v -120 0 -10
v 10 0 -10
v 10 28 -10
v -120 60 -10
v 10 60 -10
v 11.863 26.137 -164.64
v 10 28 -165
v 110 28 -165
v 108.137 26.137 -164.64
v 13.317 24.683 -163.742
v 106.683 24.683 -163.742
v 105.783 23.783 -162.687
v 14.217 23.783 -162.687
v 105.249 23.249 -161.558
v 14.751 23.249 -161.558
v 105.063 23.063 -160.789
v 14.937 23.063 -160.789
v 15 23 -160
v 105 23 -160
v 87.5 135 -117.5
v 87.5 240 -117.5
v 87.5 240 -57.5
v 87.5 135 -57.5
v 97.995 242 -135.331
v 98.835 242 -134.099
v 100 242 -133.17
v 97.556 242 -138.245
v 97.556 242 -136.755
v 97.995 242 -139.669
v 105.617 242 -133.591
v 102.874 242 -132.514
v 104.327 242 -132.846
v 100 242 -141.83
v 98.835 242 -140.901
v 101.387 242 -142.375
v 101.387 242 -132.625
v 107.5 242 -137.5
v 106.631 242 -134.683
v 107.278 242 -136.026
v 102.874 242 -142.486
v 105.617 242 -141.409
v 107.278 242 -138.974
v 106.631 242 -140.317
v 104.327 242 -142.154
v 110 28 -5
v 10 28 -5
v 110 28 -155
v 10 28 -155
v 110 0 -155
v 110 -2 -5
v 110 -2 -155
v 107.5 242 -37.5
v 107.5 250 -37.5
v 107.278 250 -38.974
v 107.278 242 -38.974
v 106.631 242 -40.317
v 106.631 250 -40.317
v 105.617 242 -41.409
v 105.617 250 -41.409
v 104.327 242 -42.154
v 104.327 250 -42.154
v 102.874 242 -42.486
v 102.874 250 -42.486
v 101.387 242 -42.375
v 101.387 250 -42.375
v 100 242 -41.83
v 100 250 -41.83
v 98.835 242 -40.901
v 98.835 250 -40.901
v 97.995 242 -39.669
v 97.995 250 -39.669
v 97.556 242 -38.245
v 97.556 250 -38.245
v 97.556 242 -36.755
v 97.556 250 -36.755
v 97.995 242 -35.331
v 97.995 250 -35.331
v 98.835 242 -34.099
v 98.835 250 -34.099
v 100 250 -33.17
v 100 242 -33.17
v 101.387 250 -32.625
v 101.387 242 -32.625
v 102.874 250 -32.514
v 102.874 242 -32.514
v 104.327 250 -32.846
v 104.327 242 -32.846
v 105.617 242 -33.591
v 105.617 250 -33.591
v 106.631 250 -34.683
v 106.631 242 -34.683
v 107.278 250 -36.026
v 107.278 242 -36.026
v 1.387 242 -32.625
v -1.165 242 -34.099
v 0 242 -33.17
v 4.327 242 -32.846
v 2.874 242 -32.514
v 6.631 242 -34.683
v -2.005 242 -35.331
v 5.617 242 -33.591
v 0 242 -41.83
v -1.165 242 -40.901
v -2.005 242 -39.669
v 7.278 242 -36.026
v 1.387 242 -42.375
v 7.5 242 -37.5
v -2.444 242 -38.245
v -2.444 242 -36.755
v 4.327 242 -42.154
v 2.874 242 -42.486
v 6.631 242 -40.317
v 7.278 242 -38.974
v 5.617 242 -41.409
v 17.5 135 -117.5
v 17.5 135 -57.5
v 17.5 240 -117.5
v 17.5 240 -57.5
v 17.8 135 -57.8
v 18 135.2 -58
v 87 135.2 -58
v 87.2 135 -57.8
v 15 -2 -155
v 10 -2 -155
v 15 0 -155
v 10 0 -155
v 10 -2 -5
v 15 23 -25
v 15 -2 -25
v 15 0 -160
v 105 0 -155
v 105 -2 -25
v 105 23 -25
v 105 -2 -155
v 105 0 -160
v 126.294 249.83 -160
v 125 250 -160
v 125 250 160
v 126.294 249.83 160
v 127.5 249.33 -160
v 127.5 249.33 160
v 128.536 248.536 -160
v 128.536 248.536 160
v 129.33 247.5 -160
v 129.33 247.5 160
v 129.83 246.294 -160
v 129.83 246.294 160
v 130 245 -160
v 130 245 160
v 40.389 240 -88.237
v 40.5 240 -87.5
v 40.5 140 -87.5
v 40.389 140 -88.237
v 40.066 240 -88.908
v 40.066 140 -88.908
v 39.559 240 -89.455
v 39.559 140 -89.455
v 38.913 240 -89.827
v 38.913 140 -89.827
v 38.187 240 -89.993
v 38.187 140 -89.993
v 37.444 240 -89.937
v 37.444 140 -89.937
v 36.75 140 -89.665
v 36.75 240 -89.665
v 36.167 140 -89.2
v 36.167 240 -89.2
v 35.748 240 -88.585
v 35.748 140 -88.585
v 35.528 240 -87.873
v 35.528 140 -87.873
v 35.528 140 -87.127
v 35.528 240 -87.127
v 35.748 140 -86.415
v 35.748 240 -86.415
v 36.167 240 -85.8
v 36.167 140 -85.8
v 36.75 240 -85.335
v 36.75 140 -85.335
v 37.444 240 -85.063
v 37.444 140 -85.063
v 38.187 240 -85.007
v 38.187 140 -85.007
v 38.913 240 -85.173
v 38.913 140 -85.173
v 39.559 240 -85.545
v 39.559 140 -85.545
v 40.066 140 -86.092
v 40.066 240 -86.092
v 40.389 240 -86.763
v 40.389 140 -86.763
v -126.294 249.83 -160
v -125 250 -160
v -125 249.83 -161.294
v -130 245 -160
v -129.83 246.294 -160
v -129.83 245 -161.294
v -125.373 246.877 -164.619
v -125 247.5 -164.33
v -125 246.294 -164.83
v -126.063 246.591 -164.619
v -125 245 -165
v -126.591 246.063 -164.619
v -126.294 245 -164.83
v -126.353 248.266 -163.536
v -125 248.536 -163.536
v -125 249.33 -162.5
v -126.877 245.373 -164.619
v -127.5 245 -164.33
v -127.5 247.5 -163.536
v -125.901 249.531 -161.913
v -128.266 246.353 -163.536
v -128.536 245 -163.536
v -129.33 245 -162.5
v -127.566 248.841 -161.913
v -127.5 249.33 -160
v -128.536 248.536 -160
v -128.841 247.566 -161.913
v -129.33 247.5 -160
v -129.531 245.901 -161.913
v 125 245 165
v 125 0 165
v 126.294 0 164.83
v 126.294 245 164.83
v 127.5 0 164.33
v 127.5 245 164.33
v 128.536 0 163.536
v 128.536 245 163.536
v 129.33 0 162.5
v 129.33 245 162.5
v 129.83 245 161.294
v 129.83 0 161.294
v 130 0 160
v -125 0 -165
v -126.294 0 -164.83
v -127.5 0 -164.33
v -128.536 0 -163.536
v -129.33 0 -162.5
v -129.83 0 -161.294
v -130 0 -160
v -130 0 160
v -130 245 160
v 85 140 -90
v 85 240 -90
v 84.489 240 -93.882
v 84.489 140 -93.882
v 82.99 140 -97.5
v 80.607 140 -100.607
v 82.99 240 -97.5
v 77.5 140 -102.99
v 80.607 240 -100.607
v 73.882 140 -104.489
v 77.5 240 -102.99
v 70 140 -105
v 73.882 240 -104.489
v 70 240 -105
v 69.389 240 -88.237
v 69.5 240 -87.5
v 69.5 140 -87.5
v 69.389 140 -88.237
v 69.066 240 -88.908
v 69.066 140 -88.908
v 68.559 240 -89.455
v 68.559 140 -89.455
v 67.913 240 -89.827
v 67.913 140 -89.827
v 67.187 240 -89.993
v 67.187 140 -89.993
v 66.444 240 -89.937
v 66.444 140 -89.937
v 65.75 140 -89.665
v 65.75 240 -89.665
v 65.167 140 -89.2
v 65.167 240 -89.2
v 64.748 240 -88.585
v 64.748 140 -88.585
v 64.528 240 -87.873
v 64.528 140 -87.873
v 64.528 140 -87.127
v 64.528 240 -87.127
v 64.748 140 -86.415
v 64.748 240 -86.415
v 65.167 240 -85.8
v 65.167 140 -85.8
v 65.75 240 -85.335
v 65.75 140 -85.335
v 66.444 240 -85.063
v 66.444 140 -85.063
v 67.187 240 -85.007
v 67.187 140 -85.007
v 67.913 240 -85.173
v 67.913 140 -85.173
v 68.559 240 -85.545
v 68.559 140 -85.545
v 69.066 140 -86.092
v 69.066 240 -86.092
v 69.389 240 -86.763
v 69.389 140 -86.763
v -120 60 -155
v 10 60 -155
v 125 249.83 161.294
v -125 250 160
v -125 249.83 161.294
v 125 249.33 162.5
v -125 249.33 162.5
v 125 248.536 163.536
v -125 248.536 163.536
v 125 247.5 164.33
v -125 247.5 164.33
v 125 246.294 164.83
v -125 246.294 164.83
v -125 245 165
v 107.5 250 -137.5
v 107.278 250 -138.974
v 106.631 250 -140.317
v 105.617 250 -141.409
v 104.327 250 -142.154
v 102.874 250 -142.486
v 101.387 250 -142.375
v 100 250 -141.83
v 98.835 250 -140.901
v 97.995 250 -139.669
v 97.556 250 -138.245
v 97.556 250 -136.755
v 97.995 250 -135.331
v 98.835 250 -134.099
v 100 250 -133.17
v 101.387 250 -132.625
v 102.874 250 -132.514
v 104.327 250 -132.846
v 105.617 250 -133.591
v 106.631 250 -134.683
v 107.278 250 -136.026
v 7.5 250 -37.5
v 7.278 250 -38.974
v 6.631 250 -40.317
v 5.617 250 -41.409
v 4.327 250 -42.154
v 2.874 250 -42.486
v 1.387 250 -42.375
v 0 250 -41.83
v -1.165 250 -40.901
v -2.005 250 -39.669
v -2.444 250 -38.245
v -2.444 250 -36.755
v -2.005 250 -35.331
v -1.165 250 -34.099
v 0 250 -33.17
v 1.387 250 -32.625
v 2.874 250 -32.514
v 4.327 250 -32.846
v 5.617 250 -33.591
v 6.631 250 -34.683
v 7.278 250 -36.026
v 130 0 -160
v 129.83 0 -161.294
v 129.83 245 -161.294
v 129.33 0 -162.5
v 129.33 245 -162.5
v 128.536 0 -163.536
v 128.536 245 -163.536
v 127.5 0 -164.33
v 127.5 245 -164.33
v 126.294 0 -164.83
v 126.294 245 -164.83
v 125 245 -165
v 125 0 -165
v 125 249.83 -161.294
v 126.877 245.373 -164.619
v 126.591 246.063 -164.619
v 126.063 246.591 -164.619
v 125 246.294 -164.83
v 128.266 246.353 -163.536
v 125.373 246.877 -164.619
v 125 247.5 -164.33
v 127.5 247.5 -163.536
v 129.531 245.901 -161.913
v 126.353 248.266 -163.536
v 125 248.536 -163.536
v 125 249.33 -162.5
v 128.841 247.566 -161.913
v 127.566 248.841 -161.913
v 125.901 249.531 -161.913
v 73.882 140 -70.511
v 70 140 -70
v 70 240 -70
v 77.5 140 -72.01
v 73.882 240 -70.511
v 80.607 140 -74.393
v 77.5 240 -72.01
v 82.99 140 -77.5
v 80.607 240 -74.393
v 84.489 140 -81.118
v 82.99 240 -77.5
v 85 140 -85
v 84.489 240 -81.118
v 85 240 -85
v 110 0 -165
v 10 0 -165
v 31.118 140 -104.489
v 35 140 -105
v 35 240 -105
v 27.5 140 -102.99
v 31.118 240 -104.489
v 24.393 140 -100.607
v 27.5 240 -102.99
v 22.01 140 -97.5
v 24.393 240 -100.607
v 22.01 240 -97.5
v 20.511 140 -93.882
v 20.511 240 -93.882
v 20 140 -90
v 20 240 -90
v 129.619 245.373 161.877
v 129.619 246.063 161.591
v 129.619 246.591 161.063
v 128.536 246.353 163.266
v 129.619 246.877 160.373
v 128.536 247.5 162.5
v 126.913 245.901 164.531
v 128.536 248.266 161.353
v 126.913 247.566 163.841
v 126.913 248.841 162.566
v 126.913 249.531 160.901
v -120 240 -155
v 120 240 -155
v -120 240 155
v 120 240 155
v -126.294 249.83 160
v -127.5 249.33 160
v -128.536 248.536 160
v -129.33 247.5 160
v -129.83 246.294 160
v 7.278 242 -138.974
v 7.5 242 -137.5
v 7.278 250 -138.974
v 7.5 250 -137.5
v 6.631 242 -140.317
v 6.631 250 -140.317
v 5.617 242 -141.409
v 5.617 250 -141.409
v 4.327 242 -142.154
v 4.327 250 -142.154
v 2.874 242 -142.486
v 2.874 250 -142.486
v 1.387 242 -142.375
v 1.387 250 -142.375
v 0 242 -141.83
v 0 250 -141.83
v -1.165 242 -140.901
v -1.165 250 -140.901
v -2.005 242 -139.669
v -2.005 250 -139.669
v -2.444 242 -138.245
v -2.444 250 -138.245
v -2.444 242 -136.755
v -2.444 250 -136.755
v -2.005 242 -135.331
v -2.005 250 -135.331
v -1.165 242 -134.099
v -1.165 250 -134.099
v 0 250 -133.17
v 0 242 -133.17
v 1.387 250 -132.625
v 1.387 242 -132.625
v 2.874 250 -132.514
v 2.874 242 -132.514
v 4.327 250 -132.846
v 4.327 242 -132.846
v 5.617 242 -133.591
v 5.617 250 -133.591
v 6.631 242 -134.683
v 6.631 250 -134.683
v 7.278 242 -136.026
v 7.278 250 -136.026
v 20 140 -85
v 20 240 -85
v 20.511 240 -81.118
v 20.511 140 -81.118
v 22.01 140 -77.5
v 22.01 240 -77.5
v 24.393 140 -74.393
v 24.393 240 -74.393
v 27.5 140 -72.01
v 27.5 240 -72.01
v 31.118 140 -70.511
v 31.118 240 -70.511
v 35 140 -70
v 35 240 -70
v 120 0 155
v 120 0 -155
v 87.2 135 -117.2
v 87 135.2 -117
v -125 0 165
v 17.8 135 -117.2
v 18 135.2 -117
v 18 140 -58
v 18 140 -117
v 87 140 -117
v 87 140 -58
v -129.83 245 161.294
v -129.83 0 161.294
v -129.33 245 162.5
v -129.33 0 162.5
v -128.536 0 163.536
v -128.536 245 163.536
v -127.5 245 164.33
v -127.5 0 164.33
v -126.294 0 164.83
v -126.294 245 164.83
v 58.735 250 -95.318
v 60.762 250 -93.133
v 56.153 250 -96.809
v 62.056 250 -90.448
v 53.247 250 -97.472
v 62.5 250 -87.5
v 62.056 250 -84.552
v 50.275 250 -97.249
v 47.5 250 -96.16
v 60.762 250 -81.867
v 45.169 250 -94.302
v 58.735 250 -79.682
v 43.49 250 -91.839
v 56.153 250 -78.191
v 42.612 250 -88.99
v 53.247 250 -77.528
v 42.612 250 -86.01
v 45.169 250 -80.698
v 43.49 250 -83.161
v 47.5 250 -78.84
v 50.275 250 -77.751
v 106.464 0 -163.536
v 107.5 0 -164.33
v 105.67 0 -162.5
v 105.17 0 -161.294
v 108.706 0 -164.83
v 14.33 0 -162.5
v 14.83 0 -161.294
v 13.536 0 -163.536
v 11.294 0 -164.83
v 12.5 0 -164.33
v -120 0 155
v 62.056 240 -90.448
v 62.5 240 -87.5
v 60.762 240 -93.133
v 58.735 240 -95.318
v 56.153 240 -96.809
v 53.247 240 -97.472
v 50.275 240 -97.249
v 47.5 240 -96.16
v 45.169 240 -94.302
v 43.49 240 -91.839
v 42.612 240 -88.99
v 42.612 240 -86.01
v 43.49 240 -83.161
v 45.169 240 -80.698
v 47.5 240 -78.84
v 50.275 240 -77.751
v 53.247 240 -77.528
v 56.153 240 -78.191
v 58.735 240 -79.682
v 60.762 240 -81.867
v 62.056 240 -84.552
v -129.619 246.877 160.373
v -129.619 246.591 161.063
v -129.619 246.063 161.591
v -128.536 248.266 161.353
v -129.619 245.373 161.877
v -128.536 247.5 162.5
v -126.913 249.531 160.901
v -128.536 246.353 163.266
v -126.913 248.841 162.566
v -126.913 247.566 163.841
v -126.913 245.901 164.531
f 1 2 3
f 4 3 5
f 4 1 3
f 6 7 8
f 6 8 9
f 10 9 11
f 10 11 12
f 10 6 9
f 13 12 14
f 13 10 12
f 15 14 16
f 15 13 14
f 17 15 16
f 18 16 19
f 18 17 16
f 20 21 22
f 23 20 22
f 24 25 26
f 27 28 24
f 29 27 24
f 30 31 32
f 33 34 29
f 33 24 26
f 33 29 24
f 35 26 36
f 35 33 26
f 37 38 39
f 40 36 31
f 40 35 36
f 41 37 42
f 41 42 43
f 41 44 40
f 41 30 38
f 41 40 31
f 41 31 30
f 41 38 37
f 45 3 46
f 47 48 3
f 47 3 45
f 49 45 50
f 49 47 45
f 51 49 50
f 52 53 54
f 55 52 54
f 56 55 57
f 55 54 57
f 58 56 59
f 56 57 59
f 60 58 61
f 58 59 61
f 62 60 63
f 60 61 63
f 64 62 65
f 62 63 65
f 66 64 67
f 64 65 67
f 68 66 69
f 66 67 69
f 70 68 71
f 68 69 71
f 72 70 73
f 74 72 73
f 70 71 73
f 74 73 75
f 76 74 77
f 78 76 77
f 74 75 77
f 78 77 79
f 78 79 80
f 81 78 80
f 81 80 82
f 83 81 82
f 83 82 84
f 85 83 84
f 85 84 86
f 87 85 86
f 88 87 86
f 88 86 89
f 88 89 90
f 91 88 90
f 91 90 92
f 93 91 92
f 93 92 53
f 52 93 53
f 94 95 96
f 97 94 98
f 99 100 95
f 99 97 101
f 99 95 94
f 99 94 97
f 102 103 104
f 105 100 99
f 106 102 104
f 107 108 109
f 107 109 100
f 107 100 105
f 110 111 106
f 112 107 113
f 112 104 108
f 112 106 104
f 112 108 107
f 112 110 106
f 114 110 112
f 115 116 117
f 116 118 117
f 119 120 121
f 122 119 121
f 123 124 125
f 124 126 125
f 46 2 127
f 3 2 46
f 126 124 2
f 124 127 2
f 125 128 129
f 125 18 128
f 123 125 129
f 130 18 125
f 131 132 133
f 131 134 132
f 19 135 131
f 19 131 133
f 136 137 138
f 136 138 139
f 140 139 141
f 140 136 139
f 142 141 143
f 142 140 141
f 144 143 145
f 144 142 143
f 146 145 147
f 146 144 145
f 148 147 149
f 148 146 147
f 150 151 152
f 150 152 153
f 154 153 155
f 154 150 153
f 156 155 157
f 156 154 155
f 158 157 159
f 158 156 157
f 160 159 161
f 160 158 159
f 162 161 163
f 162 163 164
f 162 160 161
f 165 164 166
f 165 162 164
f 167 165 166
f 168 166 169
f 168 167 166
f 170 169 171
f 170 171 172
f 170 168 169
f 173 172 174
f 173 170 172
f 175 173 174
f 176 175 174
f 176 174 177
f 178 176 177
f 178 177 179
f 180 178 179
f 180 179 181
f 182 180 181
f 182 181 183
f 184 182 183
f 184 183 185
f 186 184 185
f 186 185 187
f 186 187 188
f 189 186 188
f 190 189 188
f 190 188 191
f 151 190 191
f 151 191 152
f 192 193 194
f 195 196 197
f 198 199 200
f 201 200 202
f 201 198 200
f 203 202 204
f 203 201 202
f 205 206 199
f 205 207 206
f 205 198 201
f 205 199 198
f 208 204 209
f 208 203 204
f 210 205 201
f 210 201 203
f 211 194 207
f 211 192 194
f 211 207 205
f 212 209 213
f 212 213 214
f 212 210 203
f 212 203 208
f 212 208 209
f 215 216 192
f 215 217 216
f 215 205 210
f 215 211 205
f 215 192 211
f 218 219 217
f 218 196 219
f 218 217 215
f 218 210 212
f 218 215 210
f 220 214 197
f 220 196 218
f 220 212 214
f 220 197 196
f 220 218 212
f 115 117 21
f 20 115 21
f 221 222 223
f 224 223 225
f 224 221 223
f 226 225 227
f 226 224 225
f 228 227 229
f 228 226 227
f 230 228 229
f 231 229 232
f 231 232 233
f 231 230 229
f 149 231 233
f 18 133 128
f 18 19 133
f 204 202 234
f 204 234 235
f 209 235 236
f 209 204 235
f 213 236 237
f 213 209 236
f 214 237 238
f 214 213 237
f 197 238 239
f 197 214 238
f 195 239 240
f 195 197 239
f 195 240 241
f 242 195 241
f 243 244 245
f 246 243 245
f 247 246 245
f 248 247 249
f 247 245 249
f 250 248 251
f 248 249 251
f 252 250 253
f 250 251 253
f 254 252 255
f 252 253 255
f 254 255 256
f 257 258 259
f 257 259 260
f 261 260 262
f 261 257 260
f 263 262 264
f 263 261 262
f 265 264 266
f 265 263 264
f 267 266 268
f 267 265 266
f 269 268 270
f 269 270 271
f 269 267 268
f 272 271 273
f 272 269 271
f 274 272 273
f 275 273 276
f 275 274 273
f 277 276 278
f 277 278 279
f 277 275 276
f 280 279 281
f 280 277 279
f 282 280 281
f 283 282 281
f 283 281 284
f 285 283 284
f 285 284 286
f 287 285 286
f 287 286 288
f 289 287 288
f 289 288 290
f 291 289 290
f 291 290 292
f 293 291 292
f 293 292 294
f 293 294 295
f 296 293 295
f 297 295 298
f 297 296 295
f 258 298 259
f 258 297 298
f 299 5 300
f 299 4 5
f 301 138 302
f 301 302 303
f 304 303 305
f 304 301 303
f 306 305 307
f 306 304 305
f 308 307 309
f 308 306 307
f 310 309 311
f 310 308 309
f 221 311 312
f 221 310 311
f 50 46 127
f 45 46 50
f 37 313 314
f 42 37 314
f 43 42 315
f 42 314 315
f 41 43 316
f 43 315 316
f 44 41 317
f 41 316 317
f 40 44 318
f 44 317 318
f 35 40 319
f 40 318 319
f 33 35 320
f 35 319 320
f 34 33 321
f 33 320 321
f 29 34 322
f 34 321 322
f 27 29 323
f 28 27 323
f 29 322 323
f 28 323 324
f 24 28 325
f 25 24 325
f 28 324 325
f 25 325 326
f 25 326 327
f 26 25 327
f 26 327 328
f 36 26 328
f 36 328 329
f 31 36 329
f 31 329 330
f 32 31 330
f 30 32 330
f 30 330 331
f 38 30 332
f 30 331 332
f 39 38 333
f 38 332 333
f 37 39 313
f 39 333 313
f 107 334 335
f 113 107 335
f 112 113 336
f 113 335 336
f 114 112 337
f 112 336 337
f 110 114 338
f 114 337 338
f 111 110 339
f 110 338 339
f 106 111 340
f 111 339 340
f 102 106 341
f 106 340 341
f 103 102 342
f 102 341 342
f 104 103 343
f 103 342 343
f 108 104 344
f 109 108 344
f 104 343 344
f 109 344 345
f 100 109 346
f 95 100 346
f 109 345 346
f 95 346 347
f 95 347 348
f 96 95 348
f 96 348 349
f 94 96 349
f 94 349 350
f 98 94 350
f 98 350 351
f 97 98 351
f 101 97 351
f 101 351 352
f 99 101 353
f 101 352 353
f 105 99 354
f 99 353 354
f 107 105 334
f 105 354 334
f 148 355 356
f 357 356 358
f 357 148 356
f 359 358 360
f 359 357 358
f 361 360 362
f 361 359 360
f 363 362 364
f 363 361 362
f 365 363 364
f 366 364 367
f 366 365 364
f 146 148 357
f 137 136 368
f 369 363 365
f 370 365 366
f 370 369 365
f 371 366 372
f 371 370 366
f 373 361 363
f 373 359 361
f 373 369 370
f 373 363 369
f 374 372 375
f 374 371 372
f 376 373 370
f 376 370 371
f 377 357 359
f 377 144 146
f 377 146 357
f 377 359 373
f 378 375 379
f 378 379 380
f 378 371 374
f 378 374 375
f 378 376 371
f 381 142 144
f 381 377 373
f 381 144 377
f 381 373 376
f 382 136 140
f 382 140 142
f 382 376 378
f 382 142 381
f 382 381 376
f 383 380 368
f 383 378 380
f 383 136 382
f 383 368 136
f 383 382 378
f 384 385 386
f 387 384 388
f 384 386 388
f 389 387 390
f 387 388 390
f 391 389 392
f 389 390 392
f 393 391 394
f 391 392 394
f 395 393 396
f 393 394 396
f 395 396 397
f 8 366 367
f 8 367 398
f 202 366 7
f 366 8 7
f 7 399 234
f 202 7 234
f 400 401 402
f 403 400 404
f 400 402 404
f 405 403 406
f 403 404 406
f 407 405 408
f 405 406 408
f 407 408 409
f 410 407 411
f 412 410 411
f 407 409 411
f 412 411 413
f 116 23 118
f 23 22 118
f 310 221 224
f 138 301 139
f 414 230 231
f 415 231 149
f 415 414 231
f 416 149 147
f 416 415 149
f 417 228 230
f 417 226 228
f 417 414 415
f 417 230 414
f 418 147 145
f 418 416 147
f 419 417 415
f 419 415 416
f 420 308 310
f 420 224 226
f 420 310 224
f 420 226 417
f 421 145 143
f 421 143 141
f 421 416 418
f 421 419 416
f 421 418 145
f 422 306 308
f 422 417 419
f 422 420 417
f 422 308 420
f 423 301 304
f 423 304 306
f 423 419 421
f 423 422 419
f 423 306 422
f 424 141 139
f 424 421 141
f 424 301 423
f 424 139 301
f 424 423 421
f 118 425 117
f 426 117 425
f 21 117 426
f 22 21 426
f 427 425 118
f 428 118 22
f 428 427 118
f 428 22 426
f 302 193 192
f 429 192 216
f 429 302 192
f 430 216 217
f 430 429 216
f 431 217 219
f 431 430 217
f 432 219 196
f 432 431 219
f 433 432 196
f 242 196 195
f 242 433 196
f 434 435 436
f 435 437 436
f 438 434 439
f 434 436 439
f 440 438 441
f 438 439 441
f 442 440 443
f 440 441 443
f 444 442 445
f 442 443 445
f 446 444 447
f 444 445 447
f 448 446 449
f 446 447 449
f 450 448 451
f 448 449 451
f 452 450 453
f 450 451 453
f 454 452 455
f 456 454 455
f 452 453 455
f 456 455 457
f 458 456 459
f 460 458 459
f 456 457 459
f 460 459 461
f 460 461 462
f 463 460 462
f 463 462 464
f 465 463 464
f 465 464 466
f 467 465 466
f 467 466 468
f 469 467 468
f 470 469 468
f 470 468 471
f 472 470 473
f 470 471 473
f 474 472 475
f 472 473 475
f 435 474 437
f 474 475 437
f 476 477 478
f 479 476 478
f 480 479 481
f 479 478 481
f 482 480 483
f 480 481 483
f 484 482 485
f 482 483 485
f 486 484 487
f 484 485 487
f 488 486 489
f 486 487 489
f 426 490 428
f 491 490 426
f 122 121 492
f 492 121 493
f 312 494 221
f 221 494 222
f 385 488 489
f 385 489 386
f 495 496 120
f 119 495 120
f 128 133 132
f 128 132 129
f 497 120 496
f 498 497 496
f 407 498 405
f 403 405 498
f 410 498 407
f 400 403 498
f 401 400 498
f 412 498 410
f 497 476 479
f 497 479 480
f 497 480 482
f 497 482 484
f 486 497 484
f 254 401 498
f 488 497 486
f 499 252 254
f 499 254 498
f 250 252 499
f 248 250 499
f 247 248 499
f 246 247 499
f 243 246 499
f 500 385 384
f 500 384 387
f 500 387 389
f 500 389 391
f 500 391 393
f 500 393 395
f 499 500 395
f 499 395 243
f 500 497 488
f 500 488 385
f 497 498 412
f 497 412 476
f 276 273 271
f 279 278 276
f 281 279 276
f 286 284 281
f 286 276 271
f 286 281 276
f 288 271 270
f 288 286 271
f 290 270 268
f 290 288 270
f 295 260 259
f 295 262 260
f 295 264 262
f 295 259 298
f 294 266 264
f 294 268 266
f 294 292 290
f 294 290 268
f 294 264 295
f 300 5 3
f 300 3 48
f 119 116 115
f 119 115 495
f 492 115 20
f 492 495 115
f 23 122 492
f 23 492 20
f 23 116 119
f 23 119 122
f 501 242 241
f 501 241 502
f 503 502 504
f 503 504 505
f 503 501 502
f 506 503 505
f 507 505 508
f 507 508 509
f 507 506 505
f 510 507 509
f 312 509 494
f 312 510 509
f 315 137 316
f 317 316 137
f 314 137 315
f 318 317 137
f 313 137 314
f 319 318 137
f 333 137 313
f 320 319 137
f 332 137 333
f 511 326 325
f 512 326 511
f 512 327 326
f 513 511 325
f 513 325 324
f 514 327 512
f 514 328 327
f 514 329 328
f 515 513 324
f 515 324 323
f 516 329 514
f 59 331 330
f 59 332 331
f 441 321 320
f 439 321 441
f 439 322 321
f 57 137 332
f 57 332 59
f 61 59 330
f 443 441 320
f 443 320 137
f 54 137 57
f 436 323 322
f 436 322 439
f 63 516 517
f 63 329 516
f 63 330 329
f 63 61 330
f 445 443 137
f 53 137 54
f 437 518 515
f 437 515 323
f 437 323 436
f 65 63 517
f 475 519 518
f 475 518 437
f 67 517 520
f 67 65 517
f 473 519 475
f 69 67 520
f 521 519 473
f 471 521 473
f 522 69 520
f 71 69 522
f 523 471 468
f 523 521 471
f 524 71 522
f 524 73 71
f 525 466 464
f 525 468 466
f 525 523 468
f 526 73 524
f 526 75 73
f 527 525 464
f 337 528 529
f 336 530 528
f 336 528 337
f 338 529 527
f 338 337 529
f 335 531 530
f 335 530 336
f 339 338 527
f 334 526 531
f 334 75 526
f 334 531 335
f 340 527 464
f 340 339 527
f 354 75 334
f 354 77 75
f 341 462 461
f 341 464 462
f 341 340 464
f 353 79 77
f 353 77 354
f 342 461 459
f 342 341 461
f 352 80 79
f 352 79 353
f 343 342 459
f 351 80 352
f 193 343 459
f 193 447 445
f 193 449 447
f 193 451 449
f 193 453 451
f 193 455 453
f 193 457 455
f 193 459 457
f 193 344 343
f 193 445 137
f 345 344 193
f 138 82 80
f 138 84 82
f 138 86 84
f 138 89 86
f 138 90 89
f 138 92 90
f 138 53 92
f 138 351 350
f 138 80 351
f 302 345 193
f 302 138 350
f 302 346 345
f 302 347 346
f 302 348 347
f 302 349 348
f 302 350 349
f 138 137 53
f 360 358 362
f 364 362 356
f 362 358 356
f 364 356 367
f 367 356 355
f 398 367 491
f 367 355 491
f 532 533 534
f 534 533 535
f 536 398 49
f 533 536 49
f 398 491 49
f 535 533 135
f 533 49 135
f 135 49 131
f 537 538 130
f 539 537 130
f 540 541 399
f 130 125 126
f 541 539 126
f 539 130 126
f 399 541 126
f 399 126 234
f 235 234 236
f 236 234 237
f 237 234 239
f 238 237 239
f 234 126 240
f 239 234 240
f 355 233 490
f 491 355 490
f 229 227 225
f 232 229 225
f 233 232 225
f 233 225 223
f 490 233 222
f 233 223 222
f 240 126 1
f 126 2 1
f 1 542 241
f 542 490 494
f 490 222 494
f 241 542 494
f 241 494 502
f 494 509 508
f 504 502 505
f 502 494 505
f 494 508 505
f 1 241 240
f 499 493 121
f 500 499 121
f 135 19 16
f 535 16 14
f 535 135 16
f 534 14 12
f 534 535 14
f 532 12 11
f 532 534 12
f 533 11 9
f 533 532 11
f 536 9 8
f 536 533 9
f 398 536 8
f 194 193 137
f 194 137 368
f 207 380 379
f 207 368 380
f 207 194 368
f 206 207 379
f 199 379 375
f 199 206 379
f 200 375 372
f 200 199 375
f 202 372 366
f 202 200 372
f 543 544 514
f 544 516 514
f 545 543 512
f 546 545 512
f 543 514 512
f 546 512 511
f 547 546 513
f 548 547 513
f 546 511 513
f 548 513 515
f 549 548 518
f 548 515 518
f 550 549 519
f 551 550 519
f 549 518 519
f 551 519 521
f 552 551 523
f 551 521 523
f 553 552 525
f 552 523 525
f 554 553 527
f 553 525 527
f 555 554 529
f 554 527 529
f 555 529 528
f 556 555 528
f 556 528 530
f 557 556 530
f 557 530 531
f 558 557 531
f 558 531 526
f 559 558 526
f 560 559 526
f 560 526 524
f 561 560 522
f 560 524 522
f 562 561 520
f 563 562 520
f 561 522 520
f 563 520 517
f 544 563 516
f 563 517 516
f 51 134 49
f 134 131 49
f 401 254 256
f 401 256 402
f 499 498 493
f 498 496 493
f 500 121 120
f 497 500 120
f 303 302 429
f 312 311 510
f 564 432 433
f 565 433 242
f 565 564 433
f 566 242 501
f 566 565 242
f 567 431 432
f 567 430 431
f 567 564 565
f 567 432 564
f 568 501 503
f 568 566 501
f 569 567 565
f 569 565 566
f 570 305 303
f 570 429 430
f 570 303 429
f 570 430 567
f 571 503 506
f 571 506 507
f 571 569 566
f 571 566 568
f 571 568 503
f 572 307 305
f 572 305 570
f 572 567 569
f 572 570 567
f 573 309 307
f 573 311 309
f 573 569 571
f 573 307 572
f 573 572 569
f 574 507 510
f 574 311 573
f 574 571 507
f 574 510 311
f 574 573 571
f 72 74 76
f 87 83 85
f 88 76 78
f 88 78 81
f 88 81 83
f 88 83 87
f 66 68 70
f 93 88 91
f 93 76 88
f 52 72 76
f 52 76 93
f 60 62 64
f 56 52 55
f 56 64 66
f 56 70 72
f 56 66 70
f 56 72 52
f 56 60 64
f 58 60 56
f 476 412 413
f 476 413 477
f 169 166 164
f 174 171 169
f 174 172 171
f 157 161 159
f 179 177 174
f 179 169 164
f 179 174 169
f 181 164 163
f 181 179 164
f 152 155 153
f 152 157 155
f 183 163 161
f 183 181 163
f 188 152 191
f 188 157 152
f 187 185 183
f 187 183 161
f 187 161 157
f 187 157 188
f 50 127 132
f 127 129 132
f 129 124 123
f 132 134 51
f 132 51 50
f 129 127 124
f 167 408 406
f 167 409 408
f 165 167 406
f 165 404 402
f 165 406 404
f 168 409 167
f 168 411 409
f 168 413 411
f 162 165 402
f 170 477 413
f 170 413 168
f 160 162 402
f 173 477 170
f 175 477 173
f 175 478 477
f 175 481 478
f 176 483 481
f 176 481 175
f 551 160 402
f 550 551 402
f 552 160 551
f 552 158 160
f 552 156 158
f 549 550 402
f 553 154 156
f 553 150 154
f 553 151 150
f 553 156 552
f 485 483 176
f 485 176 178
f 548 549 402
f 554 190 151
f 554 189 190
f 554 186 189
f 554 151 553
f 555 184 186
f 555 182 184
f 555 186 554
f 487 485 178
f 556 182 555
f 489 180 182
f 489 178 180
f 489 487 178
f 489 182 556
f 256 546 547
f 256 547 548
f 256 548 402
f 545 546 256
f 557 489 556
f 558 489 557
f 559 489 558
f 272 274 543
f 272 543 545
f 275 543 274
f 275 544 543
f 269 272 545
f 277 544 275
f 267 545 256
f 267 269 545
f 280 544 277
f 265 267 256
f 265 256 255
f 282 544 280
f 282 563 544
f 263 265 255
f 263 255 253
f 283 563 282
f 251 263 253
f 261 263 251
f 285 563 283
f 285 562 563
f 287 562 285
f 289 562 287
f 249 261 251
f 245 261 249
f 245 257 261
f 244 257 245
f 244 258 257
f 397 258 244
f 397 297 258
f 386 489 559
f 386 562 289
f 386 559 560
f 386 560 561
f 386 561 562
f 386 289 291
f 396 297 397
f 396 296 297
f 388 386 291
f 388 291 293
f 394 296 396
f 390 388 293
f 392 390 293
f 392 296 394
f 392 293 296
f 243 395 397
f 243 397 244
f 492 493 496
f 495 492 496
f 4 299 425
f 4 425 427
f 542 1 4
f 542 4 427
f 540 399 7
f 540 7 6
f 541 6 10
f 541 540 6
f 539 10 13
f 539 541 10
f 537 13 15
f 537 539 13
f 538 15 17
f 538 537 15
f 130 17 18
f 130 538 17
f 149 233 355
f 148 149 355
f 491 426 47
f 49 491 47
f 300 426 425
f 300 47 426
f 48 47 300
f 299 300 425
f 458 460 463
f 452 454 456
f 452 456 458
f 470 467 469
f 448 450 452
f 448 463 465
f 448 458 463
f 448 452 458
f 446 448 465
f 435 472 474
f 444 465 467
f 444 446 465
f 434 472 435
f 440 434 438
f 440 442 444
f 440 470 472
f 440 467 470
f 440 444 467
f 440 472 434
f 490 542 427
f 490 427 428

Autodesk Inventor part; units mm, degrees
ref_plane "YZ Plane" through (0, 0, 0) normal (1, 0, 0) x (0, 1, 0)
ref_plane "XZ Plane" through (0, 0, 0) normal (0, 1, 0) x (-1, 0, 0)
ref_plane "XY Plane" through (0, 0, 0) normal (0, 0, 1) x (1, 0, 0)
sketch "Sketch1" plane through (0, 0, 0) normal (0, 1, 0) x (-1, 0, 0)
  line L0 (130, 165) -> (-130, 165)
  line L1 (-130, 165) -> (-130, -165)
  line L2 (-130, -165) -> (130, -165)
  line L3 (130, -165) -> (130, 165)
  point P0 (0, 0)
  point P1 (0, -165)
  point P2 (-130, 0)
  dimension "d0" = 260
  dimension "d1" = 330
extrude "Extrusion1" add sketch "Sketch1" along normal blind 250
sketch "Sketch2" plane through (0, 0, 0) normal (0, -1, 0) x (1, 0, 0)
  line L0 (-120, 155) -> (120, 155)
  line L1 (120, 155) -> (120, -155)
  line L2 (120, -155) -> (-120, -155)
  line L3 (-120, -155) -> (-120, 155)
  line L4 (-130, 165) -> (130, 165) projected
  line L5 (130, 165) -> (130, -165) projected
  point P0 (0, 0)
  point P1 (0, 155)
  point P2 (-120, 0)
  dimension "d4" = 10
  dimension "d5" = 10
extrude "Extrusion2" cut sketch "Sketch2" against normal blind 240
fillet "Fillet1" radius 5 8 edges at (0, 250, 165) (-130, 250, 0) (130, 250, 0) (0, 250, -165) (130, 125, -165) (130, 125, 165) (-130, 125, 165) (-130, 125, -165)
sketch "Sketch3" plane through (0, 250, 0) normal (0, 1, 0) x (1, 0, 0)
  circle A0 centre (2.5, 37.5) radius 5
  circle A1 centre (2.5, 137.5) radius 5
  circle A2 centre (102.5, 37.5) radius 5
  circle A3 centre (102.5, 137.5) radius 5
  line L0 (125, 160) -> (125, -160) projected
  line L1 (-125, 160) -> (125, 160) projected
  circle A4 centre (52.5, 87.5) radius 10
  point P0 (0, 0)
  dimension "d9" = 10
  dimension "d10" = 10
  dimension "d11" = 10
  dimension "d12" = 10
  dimension "d13" = 100
  dimension "d14" = 100
  dimension "d15" = 22.5
  dimension "d16" = 22.5
  dimension "d19" = 20
  dimension "d20" = 50
  dimension "d21" = 50
extrude "Extrusion3" cut sketch "Sketch3" against normal blind 8
sketch "Sketch4" plane through (52.5, 242, -87.5) normal (0, 1, 0) x (1, 0, 0)
  circle A0 centre (0, 0) radius 10 projected
  circle A1 centre (0, 0) radius 15
  point P0 (-52.5, -87.5)
extrude "Extrusion4" cut sketch "Sketch4" against normal up to next contours A0
sketch "Sketch5" plane through (0, 240, 0) normal (0, -1, 0) x (1, 0, 0)
  line L0 (87.5, -117.5) -> (17.5, -117.5)
  line L1 (17.5, -117.5) -> (17.5, -57.5)
  line L2 (17.5, -57.5) -> (87.5, -57.5)
  line L3 (87.5, -57.5) -> (87.5, -117.5)
  line L4 (120, -155) -> (-120, -155) projected
  circle A0 centre (52.5, -87.5) radius 15
  circle A1 centre (52.5, -87.5) radius 10 projected
  point P0 (0, 0)
  point P1 (17.5, -87.5)
  point P2 (52.5, -57.5)
  point P3 (52.5, -117.5)
  dimension "d24" = 70
  dimension "d25" = 60
  dimension "d52" = 70
extrude "Extrusion5" add sketch "Sketch5" along normal blind 150 contours L0 L1 L2 L3
sketch "Sketch7" plane through (0, 90, 0) normal (0, -1, 0) x (1, 0, 0)
  line L0 (85, -105) -> (20, -105)
  line L1 (20, -105) -> (20, -70)
  line L2 (20, -70) -> (85, -70)
  line L3 (85, -70) -> (85, -105)
  line L4 (17.5, -117.5) -> (87.5, -117.5) projected
  line L5 (17.5, -57.5) -> (17.5, -117.5) projected
  point P0 (0, 0)
  point P1 (52.5, -105)
  point P2 (52.5, -117.5)
  point P3 (52.5, -117.5)
  point P4 (17.5, -87.5)
  point P5 (20, -87.5)
  point P6 (100, -102.5)
  dimension "d28" = 65
  dimension "d29" = 35
extrude "Extrusion6" cut sketch "Sketch7" against normal blind 150
sketch "Sketch8" plane through (0, 240, 0) normal (0, -1, 0) x (1, 0, 0)
  point P0 (0, 0)
sketch "Sketch9" plane through (0, 240, 0) normal (0, -1, 0) x (1, 0, 0)
  circle A0 centre (67, -87.5) radius 2.5
  circle A1 centre (38, -87.5) radius 2.5
  circle A2 centre (52.5, -87.5) radius 10
  circle A3 centre (52.5, -87.5) radius 10 projected
  point P0 (0, 0)
  dimension "d32" = 5
  dimension "d33" = 5
  dimension "d43" = 14.5
  dimension "d44" = 14.5
extrude "Extrusion7" add sketch "Sketch9" along normal up to surface (150 mm away) contours A0 | A1
fillet "Fillet2" radius 15 4 edges at (20, 165, -70) (20, 165, -105) (85, 165, -70) (85, 165, -105)
sketch "Sketch10" plane through (0, 90, 0) normal (0, -1, 0) x (1, 0, 0)
  point P0 (0, 0)
sketch "Sketch11" plane through (0, 90, 0) normal (0, -1, 0) x (1, 0, 0)
  line L0 (18.5, -58.5) -> (86.5, -58.5)
  line L1 (86.5, -58.5) -> (86.5, -116.5)
  line L2 (86.5, -116.5) -> (18.5, -116.5)
  line L3 (18.5, -116.5) -> (18.5, -58.5)
  line L4 (17.5, -57.5) -> (17.5, -117.5) projected
  line L5 (87.5, -117.5) -> (87.5, -57.5) projected
  line L6 (87.5, -57.5) -> (17.5, -57.5) projected
  line L7 (17.5, -117.5) -> (87.5, -117.5) projected
  point P0 (0, 0)
  point P1 (100, -42.5)
  point P2 (100, -102.5)
  dimension "d46" = 1
  dimension "d47" = 1
  dimension "d48" = 1
  dimension "d49" = 1
extrude "Extrusion8" add sketch "Sketch11" along normal blind 5
sketch "Sketch12" plane through (-120, 0, 155) normal (1, 0, 0) x (0, 0, -1)
  line L0 (315, 0) -> (165, 0)
  line L1 (165, 0) -> (165, 60)
  line L2 (165, 60) -> (315, 60)
  line L3 (315, 60) -> (315, 0)
  line L4 (315, 245) -> (315, 0) projected
  point P0 (155, 0)
  dimension "d53" = 150
  dimension "d54" = 60
  dimension "d57" = 0
extrude "Extrusion9" add sketch "Sketch12" along normal blind 130
sketch "Sketch15" plane through (0, 85, 0) normal (0, -1, 0) x (1, 0, 0)
  line L0 (97.9773, -47.1324) -> (13.5699, -47.1324)
  line L1 (13.5699, -47.1324) -> (13.5699, -120.1648)
  line L2 (13.5699, -120.1648) -> (97.9773, -120.1648)
  line L3 (97.9773, -120.1648) -> (97.9773, -47.1324)
  point P0 (0, 0)
extrude "Extrusion11" cut sketch "Sketch15" against normal blind 50
sketch "Sketch17" plane through (0, 135, 0) normal (0, -1, 0) x (1, 0, 0)
  line L0 (87.5, -57.5) -> (87.5, -117.5) projected
  line L1 (87.5, -117.5) -> (17.5, -117.5) projected
  line L2 (87.5, -57.5) -> (17.5, -57.5)
  line L3 (17.5, -57.5) -> (17.5, -117.5)
  line L4 (17.5, -117.5) -> (87.5, -117.5)
  line L5 (87.5, -117.5) -> (87.5, -57.5)
  line L6 (87, -58) -> (18, -58)
  line L7 (18, -58) -> (18, -117)
  line L8 (18, -117) -> (87, -117)
  line L9 (87, -117) -> (87, -58)
  point P0 (0, 0)
  dimension "d70" = 0.5
  dimension "d71" = 0.5
  dimension "d72" = 0.5
  dimension "d73" = 0.5
extrude "Extrusion12" cut sketch "Sketch17" against normal blind 5 contours L9 L8 L7 L6
chamfer "Chamfer2" distance 0.2 angle 45 4 edges at (52.5, 135, -117) (87, 135, -87.5) (52.5, 135, -58) (18, 135, -87.5)
sketch "Sketch18" plane through (-120, 240, -155) normal (0, 0, 1) x (1, 0, 0)
  line L0 (-10.236, -242) -> (249.4607, -242) projected
  line L1 (230, -242) -> (130, -242)
  line L2 (130, -242) -> (130, -212)
  line L3 (130, -212) -> (230, -212)
  line L4 (230, -212) -> (230, -242)
  line L5 (250, 5) -> (250, -240) projected
  line L6 (245, -240) -> (245, 5) projected
  point P0 (120, -240)
  dimension "d79" = 100
  dimension "d80" = 30
  dimension "d91" = 15
extrude "Extrusion13" add sketch "Sketch18" along normal blind 150
sketch "Sketch19" plane through (125, 245, -165) normal (0, 0, -1) x (-1, 0, 0)
  line L0 (115, -247) -> (15, -247) projected
  line L1 (115, -217) -> (115, -247) projected
  line L2 (115, -247) -> (15, -247) projected
  line L3 (15, -247) -> (15, -217) projected
  line L4 (15, -217) -> (115, -217) projected
  line L5 (20, -222) -> (110, -222)
  line L6 (110, -222) -> (110, -265.9747)
  line L7 (110, -265.9747) -> (20, -265.9747)
  line L8 (20, -265.9747) -> (20, -222)
  point P0 (125, -245)
  dimension "d84" = 5
  dimension "d85" = 5
  dimension "d87" = 5
extrude "Extrusion14" cut sketch "Sketch19" against normal blind 140 contours L6 L7 L8 L0 | L0 L8 L5 L6
fillet "Fillet3" radius 5 3 edges at (105, 11.5, -165) (60, 23, -165) (15, 11.5, -165)
properties part number "case" material "Gold"
